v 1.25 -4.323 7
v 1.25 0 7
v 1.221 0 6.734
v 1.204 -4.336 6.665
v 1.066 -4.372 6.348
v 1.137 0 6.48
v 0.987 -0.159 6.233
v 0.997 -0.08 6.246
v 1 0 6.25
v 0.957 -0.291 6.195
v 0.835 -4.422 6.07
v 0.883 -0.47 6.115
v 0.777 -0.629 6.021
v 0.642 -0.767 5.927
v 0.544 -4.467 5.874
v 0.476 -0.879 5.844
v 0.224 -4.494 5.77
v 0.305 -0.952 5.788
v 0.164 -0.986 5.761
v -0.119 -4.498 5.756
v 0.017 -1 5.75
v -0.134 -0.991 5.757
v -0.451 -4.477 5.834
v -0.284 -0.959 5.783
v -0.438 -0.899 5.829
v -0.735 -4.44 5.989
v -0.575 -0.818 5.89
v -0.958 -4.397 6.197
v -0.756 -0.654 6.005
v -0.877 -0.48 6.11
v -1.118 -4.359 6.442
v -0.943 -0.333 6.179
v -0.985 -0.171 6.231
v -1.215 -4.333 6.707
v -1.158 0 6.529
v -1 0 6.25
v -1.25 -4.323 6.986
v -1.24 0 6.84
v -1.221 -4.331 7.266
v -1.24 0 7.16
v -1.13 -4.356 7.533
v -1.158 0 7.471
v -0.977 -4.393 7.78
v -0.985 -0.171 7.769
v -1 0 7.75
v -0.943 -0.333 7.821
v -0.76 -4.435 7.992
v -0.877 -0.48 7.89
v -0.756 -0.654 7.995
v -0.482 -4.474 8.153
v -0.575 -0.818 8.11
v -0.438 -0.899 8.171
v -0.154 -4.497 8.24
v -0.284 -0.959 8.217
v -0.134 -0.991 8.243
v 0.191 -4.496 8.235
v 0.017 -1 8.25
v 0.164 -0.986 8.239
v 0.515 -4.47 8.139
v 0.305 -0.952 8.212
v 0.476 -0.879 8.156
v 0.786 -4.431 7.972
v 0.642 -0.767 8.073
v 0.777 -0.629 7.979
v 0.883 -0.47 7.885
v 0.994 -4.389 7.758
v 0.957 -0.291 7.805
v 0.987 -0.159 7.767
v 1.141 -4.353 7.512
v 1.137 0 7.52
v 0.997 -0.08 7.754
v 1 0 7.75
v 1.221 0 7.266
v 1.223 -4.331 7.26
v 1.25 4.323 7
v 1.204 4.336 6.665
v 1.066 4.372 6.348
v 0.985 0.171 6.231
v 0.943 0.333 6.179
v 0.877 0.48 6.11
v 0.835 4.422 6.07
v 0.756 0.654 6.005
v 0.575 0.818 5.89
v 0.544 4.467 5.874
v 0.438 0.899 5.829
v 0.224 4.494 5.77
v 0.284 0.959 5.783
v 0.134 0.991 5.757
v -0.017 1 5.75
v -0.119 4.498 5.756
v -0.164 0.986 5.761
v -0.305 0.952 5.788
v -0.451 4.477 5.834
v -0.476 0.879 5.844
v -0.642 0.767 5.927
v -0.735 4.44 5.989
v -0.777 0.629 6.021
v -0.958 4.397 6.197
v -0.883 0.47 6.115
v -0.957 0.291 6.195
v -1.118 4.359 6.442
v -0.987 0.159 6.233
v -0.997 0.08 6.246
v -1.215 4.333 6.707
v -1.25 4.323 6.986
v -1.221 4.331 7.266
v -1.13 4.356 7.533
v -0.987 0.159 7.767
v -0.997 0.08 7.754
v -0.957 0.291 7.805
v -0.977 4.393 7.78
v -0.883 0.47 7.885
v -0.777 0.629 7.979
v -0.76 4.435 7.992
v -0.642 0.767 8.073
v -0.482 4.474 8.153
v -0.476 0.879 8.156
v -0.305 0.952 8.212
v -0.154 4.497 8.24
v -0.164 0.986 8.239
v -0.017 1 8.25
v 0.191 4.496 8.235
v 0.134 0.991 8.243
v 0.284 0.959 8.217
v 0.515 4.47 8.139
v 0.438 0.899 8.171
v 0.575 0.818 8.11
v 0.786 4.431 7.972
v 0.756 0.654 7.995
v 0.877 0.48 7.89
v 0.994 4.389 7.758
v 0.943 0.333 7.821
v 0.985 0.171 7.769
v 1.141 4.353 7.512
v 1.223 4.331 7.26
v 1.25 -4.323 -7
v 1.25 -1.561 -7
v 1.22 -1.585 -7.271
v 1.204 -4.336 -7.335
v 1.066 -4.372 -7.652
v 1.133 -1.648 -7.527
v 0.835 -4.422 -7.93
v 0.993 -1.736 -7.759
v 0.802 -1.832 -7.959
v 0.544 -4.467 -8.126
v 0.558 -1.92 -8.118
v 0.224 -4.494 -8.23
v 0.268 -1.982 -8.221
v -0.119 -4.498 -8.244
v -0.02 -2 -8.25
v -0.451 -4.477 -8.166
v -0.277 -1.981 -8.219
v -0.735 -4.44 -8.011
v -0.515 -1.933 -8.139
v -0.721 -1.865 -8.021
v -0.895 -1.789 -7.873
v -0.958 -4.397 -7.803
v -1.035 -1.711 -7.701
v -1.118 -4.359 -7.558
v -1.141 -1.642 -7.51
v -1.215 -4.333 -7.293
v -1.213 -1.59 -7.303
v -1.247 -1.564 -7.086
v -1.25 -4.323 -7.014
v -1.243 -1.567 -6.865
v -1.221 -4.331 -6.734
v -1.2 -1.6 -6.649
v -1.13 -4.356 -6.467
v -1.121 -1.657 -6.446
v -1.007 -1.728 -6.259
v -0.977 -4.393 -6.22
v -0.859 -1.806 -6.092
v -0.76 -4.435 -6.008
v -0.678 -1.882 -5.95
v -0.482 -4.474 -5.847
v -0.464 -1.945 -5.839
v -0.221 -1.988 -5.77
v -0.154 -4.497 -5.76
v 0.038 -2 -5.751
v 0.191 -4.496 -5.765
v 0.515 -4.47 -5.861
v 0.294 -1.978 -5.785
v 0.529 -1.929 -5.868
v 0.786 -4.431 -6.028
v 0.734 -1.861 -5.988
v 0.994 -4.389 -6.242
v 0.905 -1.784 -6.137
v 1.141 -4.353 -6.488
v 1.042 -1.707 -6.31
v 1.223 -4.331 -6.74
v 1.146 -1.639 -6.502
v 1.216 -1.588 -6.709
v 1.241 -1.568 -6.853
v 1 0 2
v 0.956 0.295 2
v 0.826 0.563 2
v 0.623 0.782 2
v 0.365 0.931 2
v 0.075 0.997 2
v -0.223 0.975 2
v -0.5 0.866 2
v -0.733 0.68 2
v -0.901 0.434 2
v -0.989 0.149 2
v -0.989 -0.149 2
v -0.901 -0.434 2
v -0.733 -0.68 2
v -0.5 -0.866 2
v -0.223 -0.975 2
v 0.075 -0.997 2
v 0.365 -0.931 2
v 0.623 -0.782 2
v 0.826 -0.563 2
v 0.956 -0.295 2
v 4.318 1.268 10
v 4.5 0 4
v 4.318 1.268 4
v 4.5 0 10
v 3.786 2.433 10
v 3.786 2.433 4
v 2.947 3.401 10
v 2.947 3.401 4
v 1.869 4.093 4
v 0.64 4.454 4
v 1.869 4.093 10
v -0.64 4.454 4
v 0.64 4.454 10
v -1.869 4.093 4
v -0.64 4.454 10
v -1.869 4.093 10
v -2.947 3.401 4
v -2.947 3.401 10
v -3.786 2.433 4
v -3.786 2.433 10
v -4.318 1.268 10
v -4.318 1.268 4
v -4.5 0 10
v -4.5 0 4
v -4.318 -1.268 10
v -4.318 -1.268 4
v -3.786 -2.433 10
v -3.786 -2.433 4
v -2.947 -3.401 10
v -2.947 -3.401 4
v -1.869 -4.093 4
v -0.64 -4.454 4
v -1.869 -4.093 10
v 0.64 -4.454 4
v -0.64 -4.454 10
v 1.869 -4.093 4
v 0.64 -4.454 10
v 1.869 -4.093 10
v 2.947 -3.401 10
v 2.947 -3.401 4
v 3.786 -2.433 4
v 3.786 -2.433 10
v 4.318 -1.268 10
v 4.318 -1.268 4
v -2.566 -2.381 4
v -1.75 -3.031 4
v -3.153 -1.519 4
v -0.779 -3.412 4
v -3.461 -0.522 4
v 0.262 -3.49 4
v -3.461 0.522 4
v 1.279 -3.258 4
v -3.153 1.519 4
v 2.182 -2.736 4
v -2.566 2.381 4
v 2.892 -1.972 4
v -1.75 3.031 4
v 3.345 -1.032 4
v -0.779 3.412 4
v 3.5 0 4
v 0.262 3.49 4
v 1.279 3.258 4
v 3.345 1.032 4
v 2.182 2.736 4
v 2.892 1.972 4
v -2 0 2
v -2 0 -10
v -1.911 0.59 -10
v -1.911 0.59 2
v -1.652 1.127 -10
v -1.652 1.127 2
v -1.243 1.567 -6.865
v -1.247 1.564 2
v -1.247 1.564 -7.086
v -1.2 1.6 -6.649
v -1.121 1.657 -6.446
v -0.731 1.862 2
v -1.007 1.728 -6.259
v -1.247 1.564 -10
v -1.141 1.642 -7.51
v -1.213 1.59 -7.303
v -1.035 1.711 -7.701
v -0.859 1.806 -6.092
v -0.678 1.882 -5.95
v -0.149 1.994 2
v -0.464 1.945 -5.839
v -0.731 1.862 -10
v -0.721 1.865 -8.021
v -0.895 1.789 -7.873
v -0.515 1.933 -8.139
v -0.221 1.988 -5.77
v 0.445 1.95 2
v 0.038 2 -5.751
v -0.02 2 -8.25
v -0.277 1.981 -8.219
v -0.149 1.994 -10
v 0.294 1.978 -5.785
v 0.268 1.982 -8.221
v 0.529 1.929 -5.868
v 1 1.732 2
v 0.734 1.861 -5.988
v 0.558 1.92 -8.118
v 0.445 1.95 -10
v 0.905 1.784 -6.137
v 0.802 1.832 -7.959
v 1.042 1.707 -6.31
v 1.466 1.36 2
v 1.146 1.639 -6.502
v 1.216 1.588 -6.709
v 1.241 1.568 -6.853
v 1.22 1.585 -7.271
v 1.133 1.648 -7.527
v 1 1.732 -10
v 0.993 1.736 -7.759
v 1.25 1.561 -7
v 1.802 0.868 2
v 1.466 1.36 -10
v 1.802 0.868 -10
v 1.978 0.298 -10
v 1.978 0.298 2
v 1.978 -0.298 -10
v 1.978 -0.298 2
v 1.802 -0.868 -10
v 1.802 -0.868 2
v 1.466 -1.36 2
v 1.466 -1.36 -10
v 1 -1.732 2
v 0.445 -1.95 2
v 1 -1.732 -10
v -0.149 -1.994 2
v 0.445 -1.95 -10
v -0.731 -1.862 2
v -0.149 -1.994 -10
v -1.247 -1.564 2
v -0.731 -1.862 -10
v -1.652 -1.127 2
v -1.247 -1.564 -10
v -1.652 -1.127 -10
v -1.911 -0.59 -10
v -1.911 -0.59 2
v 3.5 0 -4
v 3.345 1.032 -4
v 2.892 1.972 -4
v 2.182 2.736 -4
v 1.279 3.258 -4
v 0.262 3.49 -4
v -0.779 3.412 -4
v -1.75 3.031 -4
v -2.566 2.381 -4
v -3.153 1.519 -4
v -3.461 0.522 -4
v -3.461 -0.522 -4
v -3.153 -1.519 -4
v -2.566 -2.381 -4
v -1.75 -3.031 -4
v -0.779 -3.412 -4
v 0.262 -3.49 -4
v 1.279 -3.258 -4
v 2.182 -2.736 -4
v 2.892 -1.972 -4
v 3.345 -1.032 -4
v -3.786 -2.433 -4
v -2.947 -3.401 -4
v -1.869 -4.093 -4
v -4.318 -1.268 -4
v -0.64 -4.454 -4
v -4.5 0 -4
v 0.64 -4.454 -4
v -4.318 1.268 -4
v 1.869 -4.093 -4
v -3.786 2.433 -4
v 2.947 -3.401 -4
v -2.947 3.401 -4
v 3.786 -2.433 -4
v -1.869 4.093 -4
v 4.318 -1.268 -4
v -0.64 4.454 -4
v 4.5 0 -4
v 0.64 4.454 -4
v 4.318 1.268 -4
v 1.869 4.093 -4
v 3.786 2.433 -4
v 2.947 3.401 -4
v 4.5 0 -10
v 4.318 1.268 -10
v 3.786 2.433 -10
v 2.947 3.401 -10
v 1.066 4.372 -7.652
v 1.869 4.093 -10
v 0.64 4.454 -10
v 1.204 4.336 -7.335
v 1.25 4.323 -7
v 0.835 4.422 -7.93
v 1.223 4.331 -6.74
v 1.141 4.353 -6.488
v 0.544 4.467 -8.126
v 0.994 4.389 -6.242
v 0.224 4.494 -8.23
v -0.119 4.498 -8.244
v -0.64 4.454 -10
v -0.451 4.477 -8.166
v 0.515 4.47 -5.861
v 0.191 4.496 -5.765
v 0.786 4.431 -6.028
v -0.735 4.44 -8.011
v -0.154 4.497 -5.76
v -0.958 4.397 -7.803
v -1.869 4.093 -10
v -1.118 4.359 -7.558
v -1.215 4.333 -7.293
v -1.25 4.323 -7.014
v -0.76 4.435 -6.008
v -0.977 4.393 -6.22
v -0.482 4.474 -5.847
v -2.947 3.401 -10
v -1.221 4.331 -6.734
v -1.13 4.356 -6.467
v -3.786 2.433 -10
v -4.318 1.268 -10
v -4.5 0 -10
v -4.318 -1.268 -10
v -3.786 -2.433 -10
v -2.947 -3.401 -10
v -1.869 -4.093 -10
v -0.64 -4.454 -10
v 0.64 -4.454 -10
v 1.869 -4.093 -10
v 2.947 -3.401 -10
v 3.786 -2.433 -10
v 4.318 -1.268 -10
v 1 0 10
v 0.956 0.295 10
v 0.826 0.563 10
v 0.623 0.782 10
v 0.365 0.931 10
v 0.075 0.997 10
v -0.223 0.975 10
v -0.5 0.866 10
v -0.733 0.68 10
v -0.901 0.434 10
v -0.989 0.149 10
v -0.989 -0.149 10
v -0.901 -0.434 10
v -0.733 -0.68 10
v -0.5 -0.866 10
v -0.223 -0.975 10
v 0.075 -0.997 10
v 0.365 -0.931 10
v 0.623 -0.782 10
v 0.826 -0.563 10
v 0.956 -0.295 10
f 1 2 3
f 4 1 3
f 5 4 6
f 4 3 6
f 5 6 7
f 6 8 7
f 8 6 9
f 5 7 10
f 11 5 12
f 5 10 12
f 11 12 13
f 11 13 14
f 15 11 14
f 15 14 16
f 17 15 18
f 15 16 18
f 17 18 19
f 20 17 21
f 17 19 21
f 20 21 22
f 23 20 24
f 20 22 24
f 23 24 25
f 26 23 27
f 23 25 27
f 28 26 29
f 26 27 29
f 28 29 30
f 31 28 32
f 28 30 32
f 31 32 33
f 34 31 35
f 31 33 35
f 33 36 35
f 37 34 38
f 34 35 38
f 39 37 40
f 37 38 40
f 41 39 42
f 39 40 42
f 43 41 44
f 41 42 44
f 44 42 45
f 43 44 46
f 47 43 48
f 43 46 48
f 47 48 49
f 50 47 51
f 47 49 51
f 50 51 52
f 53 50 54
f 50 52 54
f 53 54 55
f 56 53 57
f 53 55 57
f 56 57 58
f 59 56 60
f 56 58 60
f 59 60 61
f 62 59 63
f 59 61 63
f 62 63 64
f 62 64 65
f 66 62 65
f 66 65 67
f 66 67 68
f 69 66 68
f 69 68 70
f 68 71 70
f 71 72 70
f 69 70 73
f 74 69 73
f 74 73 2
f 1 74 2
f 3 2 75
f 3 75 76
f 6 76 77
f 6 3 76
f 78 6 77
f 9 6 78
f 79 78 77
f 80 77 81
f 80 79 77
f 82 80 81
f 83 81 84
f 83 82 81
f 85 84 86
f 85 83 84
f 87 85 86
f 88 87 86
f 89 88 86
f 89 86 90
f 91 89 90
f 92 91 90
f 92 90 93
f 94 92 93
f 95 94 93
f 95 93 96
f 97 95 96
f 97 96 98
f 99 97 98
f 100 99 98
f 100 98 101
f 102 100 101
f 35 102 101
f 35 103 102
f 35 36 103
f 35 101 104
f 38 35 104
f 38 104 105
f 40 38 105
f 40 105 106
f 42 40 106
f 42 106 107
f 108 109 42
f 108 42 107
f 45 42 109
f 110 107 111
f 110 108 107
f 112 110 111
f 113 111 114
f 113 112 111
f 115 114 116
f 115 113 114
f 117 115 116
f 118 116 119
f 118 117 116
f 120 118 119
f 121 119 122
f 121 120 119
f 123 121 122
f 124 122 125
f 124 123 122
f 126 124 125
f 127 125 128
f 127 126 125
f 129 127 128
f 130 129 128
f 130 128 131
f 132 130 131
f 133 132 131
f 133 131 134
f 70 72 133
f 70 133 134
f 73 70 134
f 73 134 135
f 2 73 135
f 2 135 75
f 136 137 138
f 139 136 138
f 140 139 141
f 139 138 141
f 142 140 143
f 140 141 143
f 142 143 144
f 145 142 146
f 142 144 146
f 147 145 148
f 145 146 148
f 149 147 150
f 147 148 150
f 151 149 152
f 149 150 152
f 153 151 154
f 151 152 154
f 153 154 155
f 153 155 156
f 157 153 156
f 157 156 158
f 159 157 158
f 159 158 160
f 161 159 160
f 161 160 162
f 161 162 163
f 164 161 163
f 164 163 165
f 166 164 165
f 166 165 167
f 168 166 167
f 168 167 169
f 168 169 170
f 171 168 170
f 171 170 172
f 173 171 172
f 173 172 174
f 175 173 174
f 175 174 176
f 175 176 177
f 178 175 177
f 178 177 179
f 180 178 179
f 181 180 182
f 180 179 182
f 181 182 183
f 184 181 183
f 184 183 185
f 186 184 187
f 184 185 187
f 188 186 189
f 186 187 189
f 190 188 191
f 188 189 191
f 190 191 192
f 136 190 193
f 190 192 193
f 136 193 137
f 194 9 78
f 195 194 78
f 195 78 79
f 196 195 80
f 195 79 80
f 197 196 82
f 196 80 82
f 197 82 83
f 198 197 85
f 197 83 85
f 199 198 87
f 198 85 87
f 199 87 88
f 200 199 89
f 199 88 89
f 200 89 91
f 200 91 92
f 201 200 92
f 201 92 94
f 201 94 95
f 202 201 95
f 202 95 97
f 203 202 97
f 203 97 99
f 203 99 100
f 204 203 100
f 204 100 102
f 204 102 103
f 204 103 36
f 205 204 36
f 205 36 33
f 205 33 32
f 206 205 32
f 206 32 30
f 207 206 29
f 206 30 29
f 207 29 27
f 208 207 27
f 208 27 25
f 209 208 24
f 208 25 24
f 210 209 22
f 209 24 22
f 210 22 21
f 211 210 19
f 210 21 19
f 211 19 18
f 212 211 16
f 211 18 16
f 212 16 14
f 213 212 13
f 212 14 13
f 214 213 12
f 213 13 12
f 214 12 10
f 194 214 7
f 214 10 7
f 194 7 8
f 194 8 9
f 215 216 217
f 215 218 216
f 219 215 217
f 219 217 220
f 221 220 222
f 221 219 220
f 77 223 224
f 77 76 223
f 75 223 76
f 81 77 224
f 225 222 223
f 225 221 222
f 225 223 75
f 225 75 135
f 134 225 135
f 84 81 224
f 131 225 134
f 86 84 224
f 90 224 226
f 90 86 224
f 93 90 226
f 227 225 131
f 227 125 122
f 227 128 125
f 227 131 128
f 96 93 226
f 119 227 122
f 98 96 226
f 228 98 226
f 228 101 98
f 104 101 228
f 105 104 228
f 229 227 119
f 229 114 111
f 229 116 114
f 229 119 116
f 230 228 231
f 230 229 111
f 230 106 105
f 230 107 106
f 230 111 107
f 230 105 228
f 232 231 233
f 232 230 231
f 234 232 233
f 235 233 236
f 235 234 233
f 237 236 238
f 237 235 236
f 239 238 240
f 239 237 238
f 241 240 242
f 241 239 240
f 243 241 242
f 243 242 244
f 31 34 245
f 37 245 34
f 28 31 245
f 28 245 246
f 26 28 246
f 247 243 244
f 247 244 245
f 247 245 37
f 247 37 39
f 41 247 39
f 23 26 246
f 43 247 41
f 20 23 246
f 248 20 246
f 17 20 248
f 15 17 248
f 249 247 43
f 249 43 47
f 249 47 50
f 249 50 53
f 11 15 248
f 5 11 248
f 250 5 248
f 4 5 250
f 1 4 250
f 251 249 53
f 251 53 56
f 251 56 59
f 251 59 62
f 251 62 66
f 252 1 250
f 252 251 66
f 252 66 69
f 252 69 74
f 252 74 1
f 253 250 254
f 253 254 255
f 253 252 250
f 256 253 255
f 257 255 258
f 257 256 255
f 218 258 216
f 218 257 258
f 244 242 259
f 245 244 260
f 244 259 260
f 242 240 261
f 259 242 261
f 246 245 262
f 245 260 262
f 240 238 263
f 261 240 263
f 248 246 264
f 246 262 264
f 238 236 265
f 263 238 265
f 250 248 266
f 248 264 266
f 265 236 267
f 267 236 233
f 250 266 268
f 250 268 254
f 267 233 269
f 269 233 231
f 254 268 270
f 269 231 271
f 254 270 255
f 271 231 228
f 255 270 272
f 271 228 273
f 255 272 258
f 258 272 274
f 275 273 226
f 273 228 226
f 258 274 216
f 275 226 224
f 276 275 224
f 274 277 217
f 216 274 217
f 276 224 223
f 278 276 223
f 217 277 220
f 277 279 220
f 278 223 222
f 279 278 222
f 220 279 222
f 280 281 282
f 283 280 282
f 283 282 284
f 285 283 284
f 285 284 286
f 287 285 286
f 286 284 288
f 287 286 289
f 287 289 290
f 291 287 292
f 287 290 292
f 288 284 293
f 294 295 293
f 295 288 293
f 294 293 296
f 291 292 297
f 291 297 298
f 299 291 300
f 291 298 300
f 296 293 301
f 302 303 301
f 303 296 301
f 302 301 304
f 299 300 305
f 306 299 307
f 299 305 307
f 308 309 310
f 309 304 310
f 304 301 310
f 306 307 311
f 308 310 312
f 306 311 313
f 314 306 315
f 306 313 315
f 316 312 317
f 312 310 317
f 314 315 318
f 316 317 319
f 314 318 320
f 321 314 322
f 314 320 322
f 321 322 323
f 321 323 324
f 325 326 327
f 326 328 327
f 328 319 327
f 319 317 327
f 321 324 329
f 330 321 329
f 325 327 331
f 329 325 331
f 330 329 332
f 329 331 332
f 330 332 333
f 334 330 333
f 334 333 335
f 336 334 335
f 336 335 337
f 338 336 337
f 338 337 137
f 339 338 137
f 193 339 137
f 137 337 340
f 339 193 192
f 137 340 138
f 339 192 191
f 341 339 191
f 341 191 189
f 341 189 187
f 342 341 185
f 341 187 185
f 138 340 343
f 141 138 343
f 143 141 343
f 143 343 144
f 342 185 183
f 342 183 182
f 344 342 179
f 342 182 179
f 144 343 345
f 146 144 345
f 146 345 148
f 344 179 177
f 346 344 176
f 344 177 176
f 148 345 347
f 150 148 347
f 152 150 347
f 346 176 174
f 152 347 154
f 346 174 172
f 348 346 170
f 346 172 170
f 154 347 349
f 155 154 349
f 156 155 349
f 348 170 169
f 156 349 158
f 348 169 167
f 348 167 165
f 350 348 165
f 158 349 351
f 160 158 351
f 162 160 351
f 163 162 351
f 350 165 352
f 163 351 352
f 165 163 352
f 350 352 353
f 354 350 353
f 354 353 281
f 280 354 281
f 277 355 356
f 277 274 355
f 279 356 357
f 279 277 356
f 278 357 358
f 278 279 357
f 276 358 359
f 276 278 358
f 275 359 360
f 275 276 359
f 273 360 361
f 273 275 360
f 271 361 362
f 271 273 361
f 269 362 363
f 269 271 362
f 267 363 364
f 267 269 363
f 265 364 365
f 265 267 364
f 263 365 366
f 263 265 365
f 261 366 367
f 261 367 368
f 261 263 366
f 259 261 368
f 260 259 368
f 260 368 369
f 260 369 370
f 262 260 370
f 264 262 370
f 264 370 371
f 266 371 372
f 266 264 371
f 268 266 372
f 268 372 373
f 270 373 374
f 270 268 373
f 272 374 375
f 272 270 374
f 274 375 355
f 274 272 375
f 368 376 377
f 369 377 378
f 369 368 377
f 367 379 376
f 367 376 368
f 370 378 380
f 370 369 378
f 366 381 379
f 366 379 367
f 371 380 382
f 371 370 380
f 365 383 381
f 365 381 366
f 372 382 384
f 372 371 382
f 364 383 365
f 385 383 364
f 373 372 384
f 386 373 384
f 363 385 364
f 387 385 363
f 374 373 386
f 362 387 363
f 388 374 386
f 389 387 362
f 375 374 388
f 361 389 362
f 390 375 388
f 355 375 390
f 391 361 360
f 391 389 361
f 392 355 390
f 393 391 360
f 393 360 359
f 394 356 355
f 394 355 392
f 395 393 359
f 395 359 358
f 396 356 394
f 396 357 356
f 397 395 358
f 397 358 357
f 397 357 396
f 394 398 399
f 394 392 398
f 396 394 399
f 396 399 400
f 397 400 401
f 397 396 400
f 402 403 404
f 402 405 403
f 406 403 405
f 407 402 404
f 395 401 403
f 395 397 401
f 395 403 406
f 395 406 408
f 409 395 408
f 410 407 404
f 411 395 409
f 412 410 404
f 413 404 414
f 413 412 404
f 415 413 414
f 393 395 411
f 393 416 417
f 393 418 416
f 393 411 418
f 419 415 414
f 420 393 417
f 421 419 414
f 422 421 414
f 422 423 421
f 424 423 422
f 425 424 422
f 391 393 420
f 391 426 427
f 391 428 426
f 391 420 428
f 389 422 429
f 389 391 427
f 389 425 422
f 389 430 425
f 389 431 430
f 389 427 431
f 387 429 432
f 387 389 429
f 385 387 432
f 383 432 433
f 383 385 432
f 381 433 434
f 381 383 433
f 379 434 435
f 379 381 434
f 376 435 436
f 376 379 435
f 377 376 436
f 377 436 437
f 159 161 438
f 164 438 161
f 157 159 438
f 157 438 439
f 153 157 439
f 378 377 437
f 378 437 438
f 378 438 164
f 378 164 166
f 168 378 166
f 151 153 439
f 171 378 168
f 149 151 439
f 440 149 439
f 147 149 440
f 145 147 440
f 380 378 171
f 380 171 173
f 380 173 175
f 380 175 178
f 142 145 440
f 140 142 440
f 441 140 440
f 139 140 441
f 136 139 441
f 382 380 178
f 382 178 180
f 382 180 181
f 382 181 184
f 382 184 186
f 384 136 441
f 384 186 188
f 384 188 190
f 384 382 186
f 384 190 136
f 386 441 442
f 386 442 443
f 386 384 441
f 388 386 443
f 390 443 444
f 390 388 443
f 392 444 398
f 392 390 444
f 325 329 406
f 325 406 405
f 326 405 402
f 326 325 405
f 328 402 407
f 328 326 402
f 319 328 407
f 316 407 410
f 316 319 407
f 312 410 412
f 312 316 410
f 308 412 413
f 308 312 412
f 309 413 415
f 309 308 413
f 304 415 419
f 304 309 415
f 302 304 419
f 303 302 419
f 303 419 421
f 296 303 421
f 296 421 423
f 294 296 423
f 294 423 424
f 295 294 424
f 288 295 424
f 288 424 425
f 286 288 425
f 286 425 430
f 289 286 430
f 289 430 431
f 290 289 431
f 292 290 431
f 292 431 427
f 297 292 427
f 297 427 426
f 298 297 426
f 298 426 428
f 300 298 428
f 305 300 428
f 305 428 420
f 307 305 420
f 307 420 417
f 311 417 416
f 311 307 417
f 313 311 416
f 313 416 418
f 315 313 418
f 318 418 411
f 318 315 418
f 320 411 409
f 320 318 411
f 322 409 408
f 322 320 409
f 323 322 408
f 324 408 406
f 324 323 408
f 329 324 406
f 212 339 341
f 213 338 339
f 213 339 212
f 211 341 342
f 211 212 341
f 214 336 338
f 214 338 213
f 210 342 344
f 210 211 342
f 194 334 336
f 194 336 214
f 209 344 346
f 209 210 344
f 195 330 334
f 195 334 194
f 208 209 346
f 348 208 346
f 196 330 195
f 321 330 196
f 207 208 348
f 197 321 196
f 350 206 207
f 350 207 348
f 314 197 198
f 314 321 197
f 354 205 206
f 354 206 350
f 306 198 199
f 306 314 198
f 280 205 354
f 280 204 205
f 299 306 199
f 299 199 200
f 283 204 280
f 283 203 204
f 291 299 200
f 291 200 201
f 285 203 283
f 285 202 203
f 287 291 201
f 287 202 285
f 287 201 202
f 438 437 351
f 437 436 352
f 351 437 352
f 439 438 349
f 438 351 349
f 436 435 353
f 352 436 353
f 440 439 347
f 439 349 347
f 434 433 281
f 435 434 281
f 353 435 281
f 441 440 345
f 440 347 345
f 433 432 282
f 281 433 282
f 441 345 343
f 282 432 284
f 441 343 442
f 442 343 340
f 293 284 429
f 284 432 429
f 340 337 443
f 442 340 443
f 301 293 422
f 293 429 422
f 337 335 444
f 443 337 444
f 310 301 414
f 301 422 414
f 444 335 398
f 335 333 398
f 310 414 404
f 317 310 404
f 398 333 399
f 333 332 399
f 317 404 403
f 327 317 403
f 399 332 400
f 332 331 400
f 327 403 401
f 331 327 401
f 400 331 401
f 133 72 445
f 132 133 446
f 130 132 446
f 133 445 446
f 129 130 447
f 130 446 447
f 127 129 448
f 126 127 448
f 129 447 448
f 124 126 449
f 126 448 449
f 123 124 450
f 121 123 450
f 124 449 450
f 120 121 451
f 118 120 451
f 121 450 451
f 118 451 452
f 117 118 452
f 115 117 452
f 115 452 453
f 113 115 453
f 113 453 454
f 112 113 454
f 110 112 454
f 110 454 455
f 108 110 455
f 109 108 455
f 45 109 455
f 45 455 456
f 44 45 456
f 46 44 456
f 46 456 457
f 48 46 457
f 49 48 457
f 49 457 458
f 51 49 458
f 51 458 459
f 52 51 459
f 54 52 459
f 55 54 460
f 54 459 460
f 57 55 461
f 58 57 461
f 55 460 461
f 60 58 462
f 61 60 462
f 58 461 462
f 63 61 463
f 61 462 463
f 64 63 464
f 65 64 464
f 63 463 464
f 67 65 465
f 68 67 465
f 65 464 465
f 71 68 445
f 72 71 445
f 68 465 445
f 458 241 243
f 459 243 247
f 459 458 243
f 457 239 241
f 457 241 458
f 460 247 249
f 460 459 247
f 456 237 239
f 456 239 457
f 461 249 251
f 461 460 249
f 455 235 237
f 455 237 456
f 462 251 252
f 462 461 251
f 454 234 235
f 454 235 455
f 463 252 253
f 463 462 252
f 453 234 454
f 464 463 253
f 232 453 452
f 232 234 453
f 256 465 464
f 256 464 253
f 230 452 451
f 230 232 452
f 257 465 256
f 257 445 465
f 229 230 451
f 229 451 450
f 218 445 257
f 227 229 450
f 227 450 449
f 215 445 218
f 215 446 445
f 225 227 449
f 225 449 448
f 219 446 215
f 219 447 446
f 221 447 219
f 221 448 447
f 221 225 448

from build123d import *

# Parameters (mm, degrees)
BOSS_EXTRUDE1_DEPTH      = 10
BOSS_EXTRUDE1_DEPTH_BACK = 10
SKETCH1_R                = 4.5
CUT_EXTRUDE1_DEPTH       = 4
CUT_EXTRUDE1_DEPTH_BACK  = 4
SKETCH2_R                = 4.5
SKETCH2_R_2              = 3.5
SKETCH3_R                = 1
CUT_EXTRUDE2_DEPTH       = 20
SKETCH4_R                = 2
CUT_EXTRUDE3_DEPTH       = 12
CUT_EXTRUDE4_DEPTH       = 10
CUT_EXTRUDE4_DEPTH_BACK  = 10
SKETCH5_R                = 1.25


with BuildPart() as part:
    # Sketch1 → Boss-Extrude1 (new, two sides: drawn at the far end of the back side and taken through both)
    with BuildSketch(Plane.XY.offset(-BOSS_EXTRUDE1_DEPTH_BACK)):
        Circle(SKETCH1_R)
    extrude(amount=BOSS_EXTRUDE1_DEPTH + BOSS_EXTRUDE1_DEPTH_BACK)

    # Sketch2 → Cut-Extrude1 (cut, two sides: drawn at the far end of the back side and taken through both)
    with BuildSketch(Plane.XY.offset(-CUT_EXTRUDE1_DEPTH_BACK)):
        Circle(SKETCH2_R)
        Circle(SKETCH2_R_2, mode=Mode.SUBTRACT)
    extrude(amount=CUT_EXTRUDE1_DEPTH + CUT_EXTRUDE1_DEPTH_BACK, mode=Mode.SUBTRACT)

    # Sketch3 → Cut-Extrude2 (cut)
    with BuildSketch(Plane.XY.offset(10)):
        Circle(SKETCH3_R)
    extrude(amount=-CUT_EXTRUDE2_DEPTH, mode=Mode.SUBTRACT)

    # Sketch4 → Cut-Extrude3 (cut)
    with BuildSketch(Plane(origin=(0, 0, -10), x_dir=(-1, 0, 0), z_dir=(0, 0, -1))):
        Circle(SKETCH4_R)
    extrude(amount=-CUT_EXTRUDE3_DEPTH, mode=Mode.SUBTRACT)

    # Sketch5 → Cut-Extrude4 (cut, two sides: drawn at the far end of the back side and taken through both)
    with BuildSketch(Plane(origin=(0, 0, 0), x_dir=(1, 0, 0), z_dir=(0, 1, 0)).offset(-CUT_EXTRUDE4_DEPTH_BACK)):
        with Locations((0, 7)):
            Circle(SKETCH5_R)
        with Locations((0, -7)):
            Circle(SKETCH5_R)
    extrude(amount=CUT_EXTRUDE4_DEPTH + CUT_EXTRUDE4_DEPTH_BACK, mode=Mode.SUBTRACT)


solid = part.part
